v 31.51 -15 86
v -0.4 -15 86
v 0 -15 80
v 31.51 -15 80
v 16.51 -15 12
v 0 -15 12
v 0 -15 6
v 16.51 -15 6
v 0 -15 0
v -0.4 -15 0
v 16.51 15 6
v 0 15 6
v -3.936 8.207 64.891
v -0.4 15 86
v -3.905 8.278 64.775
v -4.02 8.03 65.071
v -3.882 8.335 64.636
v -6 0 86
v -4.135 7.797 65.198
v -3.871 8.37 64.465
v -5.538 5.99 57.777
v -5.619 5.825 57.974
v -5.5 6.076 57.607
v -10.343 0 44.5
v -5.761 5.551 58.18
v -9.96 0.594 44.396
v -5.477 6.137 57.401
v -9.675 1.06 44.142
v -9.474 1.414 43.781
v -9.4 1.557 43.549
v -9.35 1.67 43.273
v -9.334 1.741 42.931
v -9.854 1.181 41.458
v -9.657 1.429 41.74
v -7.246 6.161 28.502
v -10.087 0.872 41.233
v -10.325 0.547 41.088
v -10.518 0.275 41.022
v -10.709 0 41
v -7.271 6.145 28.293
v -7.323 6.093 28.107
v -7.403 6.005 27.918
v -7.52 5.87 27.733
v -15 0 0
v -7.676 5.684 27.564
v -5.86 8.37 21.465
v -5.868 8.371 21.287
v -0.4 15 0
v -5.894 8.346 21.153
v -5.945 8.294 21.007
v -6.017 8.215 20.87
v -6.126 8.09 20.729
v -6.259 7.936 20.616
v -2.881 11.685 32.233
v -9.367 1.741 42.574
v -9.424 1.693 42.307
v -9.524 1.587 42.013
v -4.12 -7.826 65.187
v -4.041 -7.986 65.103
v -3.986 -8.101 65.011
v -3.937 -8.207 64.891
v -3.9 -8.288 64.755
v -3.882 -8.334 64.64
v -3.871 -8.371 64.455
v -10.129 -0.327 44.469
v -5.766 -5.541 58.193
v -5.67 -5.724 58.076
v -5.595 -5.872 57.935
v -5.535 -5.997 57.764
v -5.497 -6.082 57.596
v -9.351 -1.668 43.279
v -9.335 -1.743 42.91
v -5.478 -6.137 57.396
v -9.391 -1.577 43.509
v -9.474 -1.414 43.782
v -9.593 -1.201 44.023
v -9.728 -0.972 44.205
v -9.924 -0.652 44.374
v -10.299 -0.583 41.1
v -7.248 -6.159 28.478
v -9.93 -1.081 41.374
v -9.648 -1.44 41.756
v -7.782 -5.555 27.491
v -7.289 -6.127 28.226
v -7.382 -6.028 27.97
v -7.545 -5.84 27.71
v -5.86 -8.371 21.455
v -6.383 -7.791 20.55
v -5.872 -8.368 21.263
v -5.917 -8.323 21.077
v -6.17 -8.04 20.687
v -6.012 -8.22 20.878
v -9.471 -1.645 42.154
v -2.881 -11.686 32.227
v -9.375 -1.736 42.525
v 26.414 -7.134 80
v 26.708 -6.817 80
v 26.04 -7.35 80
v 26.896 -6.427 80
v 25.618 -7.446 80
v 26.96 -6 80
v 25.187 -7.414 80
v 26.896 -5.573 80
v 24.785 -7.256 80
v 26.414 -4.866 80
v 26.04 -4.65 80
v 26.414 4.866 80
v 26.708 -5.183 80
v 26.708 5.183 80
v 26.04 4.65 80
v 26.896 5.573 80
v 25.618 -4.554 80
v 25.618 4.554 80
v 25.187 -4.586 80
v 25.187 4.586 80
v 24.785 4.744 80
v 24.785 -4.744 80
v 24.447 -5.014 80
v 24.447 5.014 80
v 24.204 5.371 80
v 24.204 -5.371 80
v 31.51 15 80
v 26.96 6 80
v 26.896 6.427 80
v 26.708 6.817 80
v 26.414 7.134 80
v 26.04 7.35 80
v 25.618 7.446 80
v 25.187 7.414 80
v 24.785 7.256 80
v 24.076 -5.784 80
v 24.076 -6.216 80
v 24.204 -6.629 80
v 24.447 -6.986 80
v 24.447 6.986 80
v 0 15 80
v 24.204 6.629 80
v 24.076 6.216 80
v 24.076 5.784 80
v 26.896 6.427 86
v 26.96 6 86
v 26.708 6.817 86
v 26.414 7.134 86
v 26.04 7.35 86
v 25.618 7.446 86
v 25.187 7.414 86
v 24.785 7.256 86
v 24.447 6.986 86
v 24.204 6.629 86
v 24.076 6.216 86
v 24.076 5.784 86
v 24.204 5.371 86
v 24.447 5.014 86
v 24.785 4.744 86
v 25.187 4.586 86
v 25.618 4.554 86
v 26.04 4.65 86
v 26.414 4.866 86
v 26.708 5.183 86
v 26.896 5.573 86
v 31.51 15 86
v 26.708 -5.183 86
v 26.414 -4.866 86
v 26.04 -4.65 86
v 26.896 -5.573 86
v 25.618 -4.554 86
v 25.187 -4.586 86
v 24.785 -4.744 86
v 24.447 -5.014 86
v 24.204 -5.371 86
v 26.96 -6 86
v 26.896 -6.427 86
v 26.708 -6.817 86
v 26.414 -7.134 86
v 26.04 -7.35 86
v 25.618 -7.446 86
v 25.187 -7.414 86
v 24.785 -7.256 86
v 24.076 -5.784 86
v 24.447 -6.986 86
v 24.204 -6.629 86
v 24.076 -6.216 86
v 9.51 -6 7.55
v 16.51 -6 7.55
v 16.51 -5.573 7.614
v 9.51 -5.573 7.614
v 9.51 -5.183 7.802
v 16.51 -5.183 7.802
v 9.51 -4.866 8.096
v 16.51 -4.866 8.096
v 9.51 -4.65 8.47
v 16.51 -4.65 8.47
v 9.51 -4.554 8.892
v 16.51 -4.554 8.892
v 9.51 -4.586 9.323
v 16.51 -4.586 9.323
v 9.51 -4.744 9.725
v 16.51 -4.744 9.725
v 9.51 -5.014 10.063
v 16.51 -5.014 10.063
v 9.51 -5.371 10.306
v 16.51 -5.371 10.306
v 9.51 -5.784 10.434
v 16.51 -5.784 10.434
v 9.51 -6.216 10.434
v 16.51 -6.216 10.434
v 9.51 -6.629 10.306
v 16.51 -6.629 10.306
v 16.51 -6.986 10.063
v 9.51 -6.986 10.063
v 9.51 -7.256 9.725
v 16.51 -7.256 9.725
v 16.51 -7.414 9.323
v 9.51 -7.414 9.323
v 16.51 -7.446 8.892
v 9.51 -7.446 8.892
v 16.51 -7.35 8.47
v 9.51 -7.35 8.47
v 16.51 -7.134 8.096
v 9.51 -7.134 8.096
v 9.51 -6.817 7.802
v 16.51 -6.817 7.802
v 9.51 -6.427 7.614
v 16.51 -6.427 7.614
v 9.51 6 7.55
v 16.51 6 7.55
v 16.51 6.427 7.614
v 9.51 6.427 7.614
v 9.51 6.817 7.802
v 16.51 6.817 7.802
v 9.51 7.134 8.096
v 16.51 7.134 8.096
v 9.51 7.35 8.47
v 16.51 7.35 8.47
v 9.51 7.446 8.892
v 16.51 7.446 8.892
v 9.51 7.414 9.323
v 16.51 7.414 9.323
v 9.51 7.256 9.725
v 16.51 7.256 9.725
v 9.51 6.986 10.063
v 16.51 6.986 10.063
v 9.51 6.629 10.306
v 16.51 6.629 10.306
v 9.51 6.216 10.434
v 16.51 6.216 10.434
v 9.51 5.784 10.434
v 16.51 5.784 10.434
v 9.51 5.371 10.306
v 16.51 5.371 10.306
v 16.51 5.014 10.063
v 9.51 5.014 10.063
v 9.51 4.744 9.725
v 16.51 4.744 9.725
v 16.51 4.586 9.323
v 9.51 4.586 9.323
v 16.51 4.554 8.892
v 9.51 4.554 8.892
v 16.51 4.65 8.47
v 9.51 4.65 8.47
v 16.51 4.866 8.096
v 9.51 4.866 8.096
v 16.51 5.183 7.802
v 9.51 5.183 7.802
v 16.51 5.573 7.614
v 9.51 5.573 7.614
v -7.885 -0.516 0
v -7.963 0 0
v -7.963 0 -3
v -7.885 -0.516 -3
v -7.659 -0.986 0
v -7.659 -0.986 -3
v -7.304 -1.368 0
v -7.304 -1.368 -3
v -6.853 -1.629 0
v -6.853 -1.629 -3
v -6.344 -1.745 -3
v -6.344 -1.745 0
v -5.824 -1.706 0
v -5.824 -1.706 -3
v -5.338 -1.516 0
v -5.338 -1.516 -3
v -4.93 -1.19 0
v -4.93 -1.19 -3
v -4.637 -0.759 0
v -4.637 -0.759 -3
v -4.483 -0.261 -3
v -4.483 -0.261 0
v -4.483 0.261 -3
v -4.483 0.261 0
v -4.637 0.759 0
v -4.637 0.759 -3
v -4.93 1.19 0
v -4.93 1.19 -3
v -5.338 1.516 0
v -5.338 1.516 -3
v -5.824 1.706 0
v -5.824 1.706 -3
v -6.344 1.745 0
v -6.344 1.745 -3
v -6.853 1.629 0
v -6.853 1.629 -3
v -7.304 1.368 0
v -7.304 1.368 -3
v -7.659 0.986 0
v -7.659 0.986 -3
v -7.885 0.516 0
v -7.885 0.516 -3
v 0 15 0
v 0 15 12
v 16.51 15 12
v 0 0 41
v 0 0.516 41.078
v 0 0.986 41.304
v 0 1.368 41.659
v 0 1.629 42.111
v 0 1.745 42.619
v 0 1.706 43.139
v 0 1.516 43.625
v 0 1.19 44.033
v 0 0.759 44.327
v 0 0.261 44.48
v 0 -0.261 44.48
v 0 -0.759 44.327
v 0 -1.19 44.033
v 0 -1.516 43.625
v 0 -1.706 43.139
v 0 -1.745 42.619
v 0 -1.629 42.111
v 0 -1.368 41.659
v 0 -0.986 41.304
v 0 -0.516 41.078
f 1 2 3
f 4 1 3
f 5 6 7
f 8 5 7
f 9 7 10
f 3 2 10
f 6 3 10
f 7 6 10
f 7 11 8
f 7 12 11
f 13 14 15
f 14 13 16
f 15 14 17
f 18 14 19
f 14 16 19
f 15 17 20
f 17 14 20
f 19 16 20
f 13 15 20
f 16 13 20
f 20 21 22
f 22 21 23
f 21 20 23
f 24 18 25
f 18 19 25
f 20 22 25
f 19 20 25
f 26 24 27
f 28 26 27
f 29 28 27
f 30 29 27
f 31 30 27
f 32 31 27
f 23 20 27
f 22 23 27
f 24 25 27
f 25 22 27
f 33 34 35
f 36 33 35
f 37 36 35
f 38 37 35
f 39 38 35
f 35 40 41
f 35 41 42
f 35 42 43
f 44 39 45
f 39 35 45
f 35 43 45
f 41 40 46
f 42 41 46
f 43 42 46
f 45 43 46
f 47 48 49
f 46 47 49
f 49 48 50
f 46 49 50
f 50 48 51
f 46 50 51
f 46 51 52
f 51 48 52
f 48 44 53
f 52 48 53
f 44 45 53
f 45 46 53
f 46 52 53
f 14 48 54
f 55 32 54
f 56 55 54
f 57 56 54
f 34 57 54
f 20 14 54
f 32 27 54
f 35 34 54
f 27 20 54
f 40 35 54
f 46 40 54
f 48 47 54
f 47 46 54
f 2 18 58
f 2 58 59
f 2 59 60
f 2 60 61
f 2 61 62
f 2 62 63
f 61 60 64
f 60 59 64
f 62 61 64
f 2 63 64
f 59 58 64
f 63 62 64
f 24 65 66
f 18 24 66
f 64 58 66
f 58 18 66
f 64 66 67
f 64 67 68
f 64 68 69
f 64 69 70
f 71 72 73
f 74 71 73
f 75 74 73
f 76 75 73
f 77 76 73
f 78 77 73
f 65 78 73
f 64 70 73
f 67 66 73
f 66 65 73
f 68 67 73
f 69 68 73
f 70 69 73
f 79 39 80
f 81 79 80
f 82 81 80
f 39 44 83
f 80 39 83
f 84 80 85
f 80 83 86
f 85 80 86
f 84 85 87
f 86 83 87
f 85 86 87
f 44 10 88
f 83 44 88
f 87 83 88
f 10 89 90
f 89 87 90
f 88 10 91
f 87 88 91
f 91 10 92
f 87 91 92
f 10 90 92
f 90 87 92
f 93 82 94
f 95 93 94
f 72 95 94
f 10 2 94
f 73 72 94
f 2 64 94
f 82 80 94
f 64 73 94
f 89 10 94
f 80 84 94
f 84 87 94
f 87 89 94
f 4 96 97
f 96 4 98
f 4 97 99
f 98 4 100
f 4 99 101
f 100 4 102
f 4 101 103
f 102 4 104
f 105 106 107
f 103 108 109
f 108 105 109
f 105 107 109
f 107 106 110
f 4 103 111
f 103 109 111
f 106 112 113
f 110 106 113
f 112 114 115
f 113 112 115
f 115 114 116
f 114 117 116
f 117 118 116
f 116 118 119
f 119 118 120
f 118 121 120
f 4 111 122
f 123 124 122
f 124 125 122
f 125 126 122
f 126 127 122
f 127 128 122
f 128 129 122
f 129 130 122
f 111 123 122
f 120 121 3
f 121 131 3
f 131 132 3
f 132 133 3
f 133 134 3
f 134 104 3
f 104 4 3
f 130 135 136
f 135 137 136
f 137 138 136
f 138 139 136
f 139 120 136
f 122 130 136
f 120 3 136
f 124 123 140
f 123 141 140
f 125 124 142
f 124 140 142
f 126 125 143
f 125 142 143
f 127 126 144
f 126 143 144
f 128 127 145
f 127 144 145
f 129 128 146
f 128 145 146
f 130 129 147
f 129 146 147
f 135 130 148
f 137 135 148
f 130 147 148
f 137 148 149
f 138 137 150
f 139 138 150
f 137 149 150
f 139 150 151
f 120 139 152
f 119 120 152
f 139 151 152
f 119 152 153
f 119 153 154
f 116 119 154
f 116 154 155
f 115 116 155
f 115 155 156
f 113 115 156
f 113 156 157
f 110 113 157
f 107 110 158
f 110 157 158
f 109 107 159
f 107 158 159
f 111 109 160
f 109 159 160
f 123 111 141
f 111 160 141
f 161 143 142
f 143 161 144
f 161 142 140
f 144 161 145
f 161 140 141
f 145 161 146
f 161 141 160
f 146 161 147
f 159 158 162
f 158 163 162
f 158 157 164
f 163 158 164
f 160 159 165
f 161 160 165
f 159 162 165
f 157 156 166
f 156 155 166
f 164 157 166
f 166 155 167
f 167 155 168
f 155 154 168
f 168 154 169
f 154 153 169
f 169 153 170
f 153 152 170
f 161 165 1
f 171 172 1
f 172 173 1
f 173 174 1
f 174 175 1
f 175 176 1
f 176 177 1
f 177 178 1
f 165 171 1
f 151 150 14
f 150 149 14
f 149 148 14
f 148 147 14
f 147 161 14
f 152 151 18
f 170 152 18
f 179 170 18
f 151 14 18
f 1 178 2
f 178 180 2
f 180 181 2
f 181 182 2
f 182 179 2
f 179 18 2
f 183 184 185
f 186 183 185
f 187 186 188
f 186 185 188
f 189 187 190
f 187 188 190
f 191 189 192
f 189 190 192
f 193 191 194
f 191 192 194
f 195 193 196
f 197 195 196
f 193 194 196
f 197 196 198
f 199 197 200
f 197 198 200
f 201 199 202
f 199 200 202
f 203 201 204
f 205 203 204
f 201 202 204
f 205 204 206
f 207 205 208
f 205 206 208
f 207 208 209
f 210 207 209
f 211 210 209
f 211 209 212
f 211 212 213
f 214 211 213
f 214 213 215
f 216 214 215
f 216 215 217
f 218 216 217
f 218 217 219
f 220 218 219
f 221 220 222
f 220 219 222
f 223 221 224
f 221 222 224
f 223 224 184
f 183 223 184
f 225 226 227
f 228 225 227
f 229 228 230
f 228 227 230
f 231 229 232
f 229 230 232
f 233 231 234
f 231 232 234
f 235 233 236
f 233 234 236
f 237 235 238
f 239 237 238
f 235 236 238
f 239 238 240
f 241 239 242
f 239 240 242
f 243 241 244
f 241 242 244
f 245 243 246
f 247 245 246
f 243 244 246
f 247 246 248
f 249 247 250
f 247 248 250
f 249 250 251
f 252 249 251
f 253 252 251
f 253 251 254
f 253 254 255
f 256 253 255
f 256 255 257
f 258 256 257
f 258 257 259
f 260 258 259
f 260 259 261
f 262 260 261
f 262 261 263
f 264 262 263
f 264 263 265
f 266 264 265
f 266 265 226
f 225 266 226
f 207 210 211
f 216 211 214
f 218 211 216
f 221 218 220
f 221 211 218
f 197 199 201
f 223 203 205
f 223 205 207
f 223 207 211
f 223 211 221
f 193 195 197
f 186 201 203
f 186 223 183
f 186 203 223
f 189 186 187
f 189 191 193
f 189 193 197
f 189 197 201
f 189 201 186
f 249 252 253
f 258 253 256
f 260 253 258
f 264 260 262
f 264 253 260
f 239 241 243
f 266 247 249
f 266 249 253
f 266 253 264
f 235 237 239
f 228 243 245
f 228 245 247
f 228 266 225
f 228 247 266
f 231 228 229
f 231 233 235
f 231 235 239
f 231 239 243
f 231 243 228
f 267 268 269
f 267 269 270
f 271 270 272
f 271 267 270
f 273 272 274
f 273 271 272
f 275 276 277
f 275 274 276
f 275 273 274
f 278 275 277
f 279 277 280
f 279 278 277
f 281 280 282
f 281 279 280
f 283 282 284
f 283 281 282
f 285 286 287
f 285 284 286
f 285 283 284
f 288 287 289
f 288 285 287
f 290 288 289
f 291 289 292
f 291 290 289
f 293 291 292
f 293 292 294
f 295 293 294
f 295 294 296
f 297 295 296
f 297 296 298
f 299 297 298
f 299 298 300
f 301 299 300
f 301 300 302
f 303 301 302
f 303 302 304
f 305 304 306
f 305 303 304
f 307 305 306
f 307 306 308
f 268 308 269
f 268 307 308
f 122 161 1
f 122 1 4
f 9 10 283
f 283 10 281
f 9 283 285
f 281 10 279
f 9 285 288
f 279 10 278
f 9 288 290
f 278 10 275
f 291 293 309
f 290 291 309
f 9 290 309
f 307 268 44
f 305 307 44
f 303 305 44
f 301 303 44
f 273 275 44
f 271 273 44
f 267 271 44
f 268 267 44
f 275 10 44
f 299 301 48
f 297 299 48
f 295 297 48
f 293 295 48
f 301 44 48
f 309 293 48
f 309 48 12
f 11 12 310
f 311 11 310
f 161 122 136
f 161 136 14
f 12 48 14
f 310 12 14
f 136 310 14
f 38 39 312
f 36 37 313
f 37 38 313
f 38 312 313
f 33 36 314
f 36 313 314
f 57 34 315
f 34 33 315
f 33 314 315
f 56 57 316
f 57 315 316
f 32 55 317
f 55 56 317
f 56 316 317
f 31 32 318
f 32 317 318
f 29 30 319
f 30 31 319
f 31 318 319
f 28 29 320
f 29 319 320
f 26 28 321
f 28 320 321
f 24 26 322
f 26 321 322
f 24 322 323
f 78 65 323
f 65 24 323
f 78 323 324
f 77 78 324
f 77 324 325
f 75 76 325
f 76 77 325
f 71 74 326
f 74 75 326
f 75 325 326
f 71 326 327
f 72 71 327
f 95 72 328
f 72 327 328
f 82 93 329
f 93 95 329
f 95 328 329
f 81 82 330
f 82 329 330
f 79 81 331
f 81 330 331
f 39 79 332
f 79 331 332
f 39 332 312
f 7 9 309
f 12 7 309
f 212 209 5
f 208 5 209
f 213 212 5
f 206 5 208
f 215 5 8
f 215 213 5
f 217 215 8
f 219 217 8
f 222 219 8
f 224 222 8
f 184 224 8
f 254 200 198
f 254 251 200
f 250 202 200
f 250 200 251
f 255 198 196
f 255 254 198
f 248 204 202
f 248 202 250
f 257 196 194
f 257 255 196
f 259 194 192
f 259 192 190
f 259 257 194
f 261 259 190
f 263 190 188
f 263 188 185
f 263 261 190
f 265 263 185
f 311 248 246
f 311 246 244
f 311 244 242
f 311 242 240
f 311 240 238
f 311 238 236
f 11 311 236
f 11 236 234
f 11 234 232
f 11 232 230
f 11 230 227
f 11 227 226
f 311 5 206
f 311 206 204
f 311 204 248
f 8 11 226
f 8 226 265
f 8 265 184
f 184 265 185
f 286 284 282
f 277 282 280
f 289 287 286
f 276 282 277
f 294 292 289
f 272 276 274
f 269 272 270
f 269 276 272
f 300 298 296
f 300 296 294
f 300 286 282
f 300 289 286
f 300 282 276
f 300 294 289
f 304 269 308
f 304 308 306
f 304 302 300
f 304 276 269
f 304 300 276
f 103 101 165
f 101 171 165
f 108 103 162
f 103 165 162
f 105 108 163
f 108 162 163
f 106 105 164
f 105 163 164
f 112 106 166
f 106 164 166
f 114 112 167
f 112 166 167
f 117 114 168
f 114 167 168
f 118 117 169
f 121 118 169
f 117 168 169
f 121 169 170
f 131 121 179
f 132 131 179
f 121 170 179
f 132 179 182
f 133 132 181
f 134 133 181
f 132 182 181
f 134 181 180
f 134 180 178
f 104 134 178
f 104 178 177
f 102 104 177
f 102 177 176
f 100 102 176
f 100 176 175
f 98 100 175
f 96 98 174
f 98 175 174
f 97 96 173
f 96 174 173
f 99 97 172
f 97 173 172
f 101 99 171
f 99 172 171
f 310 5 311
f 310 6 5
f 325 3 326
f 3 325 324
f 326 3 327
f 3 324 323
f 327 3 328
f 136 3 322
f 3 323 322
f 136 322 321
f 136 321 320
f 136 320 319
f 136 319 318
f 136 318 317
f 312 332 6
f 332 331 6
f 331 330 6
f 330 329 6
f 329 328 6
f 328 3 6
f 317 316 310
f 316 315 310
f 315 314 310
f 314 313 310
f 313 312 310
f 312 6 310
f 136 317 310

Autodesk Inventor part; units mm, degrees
ref_plane "YZ Plane" through (0, 0, 0) normal (1, 0, 0) x (0, 1, 0)
ref_plane "XZ Plane" through (0, 0, 0) normal (0, 1, 0) x (-1, 0, 0)
sketch "Sketch1" plane through (0, 0, 0) normal (0, 0, 1) x (1, 0, 0)
  line L0 (0, -21) -> (0, 21) projected
  line L1 (0, 15) -> (0, -15)
  line L2 (0, -15) -> (-0.4, -15)
  line L3 (-0.4, -15) -> (-15, 0)
  line L4 (-15, 0) -> (-0.4, 15)
  line L5 (-0.4, 15) -> (0, 15)
  point P0 (0, 0)
  point P1 (0, 0)
  dimension "d1" = 30
  dimension "d5" = 15
  dimension "d50" = 0.4
  dimension "d51" = 15
ref_plane "Work Plane1" through (0, 0, 86) normal (0, 0, 1) x (1, 0, 0)
sketch "Sketch2" plane through (0, 0, 86) normal (0, 0, 1) x (1, 0, 0)
  line L0 (0, -21) -> (0, 21) projected
  line L1 (0, 15) -> (0, -15)
  line L2 (0, -15) -> (-0.4, -15)
  line L3 (-0.4, -15) -> (-6, 0)
  line L4 (-6, 0) -> (-0.4, 15)
  line L5 (-0.4, 15) -> (0, 15)
  point P0 (0, 0)
  dimension "d3" = 30
  dimension "d6" = 15
  dimension "d52" = 0.4
  dimension "d53" = 6
loft "Loft1" add profiles "Sketch2", "Sketch1"
sketch "Sketch3" plane through (0, -15, 86) normal (1, 0, 0) x (0, 0, -1)
  line L0 (0, 30) -> (86, 30) projected
  line L1 (0, 0) -> (86, 0) projected
  line L2 (0, 30) -> (6, 30)
  line L3 (6, 30) -> (6, 0)
  line L4 (6, 0) -> (0, 0)
  line L5 (0, 0) -> (0, 30)
  line L6 (74, 30) -> (80, 30)
  line L7 (80, 30) -> (80, 0)
  line L8 (80, 0) -> (74, 0)
  line L9 (74, 0) -> (74, 30)
  point P0 (86, 15)
  point P1 (74, 0)
  dimension "d11" = 6
  dimension "d12" = 6
  dimension "d13" = 6
extrude "Extrusion1" add sketch "Sketch3" along normal blind 16.51 contours L0 L3 L1 L5 | L0 L7 L1 L9
sketch "Sketch4" plane through (0, -15, 80) normal (1, 0, 0) x (0, 0, -1)
  circle A0 centre (37.25, 15) radius 1.75
  line L0 (-6, 30) -> (-6, 0) projected
  line L1 (-6, 15) -> (80, 15) projected
  dimension "d16" = 43.25
  dimension "d17" = 3.5
extrude "Extrusion2" cut sketch "Sketch4" against normal through all
sketch "Sketch5" plane through (0, -15, 0) normal (0, 0, -1) x (-1, 0, 0)
  line L0 (0, 0) -> (0, 30) projected
  circle A0 centre (6.2132, 15) radius 6.2132
  line L1 (15, 15) -> (0, 0) projected
  line L2 (0, 30) -> (15, 15) projected
  line L3 (0, 0) -> (0, 30) projected
  circle A1 centre (6.2132, 15) radius 1.75
  line L4 (0.4, 30) -> (15, 15) projected
  line L5 (0, 30) -> (0.4, 30) projected
  line L6 (0.4, 0) -> (0, 0) projected
  line L7 (15, 15) -> (0.4, 0) projected
  point P0 (0, 15)
  dimension "d20" = 3.5
extrude "Extrusion3" add sketch "Sketch5" along normal blind 3 contours A1
sketch "Sketch6" plane through (16.51, -15, 86) normal (1, 0, 0) x (0, 0, -1)
  line L0 (6, 0) -> (6, 30) projected
  line L1 (6, 30) -> (0, 30) projected
  line L2 (0, 30) -> (0, 0) projected
  line L3 (0, 0) -> (6, 0) projected
  point P0 (86, 15)
extrude "Extrusion4" add sketch "Sketch6" along normal blind 12
sketch "Sketch8" plane through (16.51, -15, 86) normal (1, 0, 0) x (0, 0, -1)
  line L0 (74, 3) -> (80, 3)
  line L1 (74, 0) -> (80, 0) projected
  line L2 (74, 27) -> (80, 27)
  line L3 (80, 30) -> (74, 30) projected
  line L4 (74, 0) -> (74, 30) projected
  line L5 (74, 21) -> (80, 21)
  line L6 (74, 9) -> (80, 9)
  circle A0 centre (77, 21) radius 1.45
  circle A1 centre (77, 9) radius 1.45
  line L7 (80, 0) -> (80, 30) projected
  point P0 (86, 15)
  dimension "d25" = 3
  dimension "d26" = 3
  dimension "d27" = 6
  dimension "d28" = 6
  dimension "d29" = 2.9
  dimension "d30" = 2.9
  dimension "d48" = 3
  dimension "d49" = 3
extrude "Extrusion5" cut sketch "Sketch8" against normal blind 7 contours A1 L6 | L6 A1 | A0 L5 | L5 A0
sketch "Sketch9" plane through (0, -15, 86) normal (0, 0, 1) x (1, 0, 0)
  line L0 (0, 30) -> (28.51, 30) projected
  line L1 (22.51, 30) -> (22.51, 0.0044)
  line L2 (28.51, 30) -> (28.51, 0) projected
  line L3 (28.51, 30) -> (0, 30) projected
  line L4 (-0.4, 0) -> (28.51, 0) projected
  line L5 (28.51, 3) -> (0.1043, 3)
  line L6 (28.51, 27) -> (0.4735, 27)
  line L7 (25.51, 30) -> (25.51, 0)
  line L8 (22.51, 21) -> (28.51, 21)
  line L9 (28.51, 0) -> (28.51, 30) projected
  line L10 (22.51, 9) -> (28.51, 9)
  circle A0 centre (25.51, 21) radius 1.45
  circle A1 centre (25.51, 9) radius 1.45
  point P0 (0, 15)
  point P1 (16.51, 0)
  point P2 (16.51, 30)
  point P3 (0, 0)
  dimension "d33" = 6
  dimension "d35" = 3
  dimension "d36" = 3
  dimension "d43" = 3
  dimension "d44" = 6
  dimension "d45" = 6
  dimension "d46" = 2.9
  dimension "d47" = 2.9
extrude "Extrusion6" cut sketch "Sketch9" against normal up to surface (6 mm away) contours A0 L8 L7 | L7 L8 A0 | L8 L7 A0 | L8 A0 L7 | A1 L7 L10 | L10 L7 A1 | L10 A1 L7 | L7 A1 L10
sketch "Sketch10" plane through (28.51, -15, 86) normal (1, 0, 0) x (0, 0, -1)
  line L0 (6, 30) -> (0, 30) projected
  line L1 (0, 30) -> (0, 0) projected
  line L2 (0, 0) -> (6, 0) projected
  line L3 (6, 0) -> (6, 30) projected
  point P0 (86, 15)
extrude "Extrusion7" add sketch "Sketch10" along normal blind 3
equation "\"d1\" = Height"
equation "\"d5\" = 0.5 * Height"
equation "\"d51\" = SideArmorWidth"
equation "\"d3\" = Height"
equation "\"d6\" = 0.5 * Height"
equation "\"d53\" = SideThickness"
equation "\"d11\" = SideThickness"
equation "\"d12\" = SideThickness"
equation "\"d13\" = SideThickness"
equation "\"d14\" = WheelWidth"
equation "\"d16\" = DriveMotorOffset + SideThickness"
equation "\"d17\" = DriveMotorHoleDia"
equation "\"d20\" = ForkPlugDia"
equation "\"d21\" = ForkPlugLength"
equation "\"d23\" = 2 * SideThickness"
equation "\"d25\" = BaseThickness"
equation "\"d26\" = BaseThickness"
equation "\"d27\" = SideThickness"
equation "\"d28\" = SideThickness"
equation "\"d29\" = ScrewDia"
equation "\"d30\" = ScrewDia"
equation "\"d48\" = 0.5 * SideThickness"
equation "\"d49\" = 0.5 * SideThickness"
equation "\"d31\" = ScrewDepth"
equation "\"d33\" = SideThickness"
equation "\"d35\" = BaseThickness"
equation "\"d36\" = BaseThickness"
equation "\"d43\" = 0.5 * SideThickness"
equation "\"d44\" = SideThickness"
equation "\"d45\" = SideThickness"
equation "\"d46\" = ScrewDia"
equation "\"d47\" = ScrewDia"
equation "\"d2\" = BoxLength + SideThickness"
equation "\"Height\" = 30"
equation "\"SideArmorWidth\" = 15"
equation "\"SideThickness\" = 6"
equation "\"WheelWidth\" = 16.51"
equation "\"DriveMotorOffset\" = 37.25"
equation "\"DriveMotorHoleDia\" = 3.5"
equation "\"ForkPlugDia\" = 3.5"
equation "\"ForkPlugLength\" = 3"
equation "\"BaseThickness\" = 3"
equation "\"ScrewDia\" = 2.9"
equation "\"ScrewDepth\" = 7"
equation "\"BoxLength\" = 80"
properties part number "BodyWedgeSideV3.1" material "Thermoplastic Resin"
